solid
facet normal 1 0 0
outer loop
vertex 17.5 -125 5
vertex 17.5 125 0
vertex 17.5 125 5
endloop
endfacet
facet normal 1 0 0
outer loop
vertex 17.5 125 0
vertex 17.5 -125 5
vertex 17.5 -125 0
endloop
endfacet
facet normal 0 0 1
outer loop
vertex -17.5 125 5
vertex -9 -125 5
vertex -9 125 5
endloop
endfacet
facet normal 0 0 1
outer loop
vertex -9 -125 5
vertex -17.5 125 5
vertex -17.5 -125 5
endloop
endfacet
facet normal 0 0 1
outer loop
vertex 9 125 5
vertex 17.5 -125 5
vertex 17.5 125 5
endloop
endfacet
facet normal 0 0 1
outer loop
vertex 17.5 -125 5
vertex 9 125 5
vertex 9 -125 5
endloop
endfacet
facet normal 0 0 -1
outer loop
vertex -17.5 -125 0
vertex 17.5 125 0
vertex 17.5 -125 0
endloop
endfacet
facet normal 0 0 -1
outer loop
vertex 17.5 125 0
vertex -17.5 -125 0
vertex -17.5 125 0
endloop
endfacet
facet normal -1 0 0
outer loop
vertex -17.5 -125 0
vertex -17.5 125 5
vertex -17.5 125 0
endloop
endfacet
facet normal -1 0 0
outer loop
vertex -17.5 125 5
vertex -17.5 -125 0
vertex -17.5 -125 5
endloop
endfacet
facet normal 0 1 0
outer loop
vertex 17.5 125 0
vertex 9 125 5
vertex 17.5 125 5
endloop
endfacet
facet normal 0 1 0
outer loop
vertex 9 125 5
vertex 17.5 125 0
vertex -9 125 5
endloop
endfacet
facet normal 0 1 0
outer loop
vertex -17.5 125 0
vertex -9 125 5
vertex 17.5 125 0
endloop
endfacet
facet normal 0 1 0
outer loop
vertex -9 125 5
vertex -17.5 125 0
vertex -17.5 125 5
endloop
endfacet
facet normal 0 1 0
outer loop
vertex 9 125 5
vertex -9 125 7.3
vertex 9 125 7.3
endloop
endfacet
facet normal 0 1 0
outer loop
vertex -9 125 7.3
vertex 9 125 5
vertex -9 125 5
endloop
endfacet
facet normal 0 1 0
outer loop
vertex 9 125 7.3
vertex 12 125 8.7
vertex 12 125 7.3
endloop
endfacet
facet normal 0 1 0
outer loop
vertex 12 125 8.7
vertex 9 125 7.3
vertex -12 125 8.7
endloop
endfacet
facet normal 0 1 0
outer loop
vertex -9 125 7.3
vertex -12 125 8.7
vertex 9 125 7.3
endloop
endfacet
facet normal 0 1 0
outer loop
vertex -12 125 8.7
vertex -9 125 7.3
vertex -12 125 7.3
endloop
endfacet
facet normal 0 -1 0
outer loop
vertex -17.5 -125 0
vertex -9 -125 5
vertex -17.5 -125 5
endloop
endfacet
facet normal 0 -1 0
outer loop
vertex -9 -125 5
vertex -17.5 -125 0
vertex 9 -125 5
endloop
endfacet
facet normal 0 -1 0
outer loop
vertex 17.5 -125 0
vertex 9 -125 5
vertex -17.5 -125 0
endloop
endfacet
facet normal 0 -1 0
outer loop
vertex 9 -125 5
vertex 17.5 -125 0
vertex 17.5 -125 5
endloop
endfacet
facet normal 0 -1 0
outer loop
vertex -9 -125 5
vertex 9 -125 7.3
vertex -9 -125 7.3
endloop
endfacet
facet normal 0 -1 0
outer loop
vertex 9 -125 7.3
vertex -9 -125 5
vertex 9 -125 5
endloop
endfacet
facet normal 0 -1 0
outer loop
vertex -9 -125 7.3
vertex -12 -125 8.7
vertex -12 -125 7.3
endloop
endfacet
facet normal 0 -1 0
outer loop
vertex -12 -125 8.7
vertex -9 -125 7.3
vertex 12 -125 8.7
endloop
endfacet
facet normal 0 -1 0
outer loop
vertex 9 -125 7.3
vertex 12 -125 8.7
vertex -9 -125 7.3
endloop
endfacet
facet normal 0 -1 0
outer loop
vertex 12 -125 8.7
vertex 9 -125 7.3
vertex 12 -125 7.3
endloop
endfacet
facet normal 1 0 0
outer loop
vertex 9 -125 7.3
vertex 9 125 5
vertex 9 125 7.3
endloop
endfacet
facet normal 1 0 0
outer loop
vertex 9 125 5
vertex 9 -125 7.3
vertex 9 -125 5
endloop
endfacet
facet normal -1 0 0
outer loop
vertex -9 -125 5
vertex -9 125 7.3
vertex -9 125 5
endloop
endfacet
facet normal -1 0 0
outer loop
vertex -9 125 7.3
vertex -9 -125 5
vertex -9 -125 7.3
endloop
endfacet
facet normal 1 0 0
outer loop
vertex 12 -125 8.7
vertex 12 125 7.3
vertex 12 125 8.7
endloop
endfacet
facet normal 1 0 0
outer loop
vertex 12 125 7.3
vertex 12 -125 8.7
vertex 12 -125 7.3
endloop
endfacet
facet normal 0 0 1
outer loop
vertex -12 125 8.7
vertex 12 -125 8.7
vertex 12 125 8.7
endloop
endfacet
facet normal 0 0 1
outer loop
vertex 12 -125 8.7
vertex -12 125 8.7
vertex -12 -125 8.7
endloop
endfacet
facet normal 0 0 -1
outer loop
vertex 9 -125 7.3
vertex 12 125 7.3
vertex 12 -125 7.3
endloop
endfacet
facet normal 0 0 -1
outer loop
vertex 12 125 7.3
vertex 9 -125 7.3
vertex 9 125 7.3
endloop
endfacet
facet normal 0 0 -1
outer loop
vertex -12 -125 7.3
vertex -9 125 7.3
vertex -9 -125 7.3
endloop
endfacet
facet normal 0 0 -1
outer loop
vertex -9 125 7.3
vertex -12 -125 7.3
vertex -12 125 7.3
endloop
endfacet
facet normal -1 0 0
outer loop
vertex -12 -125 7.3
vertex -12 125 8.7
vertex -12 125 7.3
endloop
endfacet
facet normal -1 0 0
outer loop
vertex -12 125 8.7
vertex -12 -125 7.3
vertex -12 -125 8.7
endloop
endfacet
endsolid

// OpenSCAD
track_w=24;
track_w_inn=19;


line_track();


module line_track() {
	l=250;
	h = 8;
	translate([0,0,2.5])
		cube([35,l,5], true);
	translate([0,0,h/2])
		difference() {
			cube([18,l,h], true);
			/*scale([1,15,45])
				rotate([45,0,0])
					cube([60,1,1], true); //*/
		}
	translate([0,0,h])
		track_holder(l);
}


module pillar() {
	h = 90;
	b = 35;
	translate([0,0,2.5])
		cube([35,35,5], true);
	translate([0,0,h/2])
		difference() {
			cube([18,35,h], true);
			scale([1,15,45])
				rotate([45,0,0])
					cube([60,1,1], true); //*/
		}
	translate([0,0,h])
		track_holder(b);
}

module track_holder(l, center = true) {
	d=1.4;
	cube([track_w,l,d], center);
}
